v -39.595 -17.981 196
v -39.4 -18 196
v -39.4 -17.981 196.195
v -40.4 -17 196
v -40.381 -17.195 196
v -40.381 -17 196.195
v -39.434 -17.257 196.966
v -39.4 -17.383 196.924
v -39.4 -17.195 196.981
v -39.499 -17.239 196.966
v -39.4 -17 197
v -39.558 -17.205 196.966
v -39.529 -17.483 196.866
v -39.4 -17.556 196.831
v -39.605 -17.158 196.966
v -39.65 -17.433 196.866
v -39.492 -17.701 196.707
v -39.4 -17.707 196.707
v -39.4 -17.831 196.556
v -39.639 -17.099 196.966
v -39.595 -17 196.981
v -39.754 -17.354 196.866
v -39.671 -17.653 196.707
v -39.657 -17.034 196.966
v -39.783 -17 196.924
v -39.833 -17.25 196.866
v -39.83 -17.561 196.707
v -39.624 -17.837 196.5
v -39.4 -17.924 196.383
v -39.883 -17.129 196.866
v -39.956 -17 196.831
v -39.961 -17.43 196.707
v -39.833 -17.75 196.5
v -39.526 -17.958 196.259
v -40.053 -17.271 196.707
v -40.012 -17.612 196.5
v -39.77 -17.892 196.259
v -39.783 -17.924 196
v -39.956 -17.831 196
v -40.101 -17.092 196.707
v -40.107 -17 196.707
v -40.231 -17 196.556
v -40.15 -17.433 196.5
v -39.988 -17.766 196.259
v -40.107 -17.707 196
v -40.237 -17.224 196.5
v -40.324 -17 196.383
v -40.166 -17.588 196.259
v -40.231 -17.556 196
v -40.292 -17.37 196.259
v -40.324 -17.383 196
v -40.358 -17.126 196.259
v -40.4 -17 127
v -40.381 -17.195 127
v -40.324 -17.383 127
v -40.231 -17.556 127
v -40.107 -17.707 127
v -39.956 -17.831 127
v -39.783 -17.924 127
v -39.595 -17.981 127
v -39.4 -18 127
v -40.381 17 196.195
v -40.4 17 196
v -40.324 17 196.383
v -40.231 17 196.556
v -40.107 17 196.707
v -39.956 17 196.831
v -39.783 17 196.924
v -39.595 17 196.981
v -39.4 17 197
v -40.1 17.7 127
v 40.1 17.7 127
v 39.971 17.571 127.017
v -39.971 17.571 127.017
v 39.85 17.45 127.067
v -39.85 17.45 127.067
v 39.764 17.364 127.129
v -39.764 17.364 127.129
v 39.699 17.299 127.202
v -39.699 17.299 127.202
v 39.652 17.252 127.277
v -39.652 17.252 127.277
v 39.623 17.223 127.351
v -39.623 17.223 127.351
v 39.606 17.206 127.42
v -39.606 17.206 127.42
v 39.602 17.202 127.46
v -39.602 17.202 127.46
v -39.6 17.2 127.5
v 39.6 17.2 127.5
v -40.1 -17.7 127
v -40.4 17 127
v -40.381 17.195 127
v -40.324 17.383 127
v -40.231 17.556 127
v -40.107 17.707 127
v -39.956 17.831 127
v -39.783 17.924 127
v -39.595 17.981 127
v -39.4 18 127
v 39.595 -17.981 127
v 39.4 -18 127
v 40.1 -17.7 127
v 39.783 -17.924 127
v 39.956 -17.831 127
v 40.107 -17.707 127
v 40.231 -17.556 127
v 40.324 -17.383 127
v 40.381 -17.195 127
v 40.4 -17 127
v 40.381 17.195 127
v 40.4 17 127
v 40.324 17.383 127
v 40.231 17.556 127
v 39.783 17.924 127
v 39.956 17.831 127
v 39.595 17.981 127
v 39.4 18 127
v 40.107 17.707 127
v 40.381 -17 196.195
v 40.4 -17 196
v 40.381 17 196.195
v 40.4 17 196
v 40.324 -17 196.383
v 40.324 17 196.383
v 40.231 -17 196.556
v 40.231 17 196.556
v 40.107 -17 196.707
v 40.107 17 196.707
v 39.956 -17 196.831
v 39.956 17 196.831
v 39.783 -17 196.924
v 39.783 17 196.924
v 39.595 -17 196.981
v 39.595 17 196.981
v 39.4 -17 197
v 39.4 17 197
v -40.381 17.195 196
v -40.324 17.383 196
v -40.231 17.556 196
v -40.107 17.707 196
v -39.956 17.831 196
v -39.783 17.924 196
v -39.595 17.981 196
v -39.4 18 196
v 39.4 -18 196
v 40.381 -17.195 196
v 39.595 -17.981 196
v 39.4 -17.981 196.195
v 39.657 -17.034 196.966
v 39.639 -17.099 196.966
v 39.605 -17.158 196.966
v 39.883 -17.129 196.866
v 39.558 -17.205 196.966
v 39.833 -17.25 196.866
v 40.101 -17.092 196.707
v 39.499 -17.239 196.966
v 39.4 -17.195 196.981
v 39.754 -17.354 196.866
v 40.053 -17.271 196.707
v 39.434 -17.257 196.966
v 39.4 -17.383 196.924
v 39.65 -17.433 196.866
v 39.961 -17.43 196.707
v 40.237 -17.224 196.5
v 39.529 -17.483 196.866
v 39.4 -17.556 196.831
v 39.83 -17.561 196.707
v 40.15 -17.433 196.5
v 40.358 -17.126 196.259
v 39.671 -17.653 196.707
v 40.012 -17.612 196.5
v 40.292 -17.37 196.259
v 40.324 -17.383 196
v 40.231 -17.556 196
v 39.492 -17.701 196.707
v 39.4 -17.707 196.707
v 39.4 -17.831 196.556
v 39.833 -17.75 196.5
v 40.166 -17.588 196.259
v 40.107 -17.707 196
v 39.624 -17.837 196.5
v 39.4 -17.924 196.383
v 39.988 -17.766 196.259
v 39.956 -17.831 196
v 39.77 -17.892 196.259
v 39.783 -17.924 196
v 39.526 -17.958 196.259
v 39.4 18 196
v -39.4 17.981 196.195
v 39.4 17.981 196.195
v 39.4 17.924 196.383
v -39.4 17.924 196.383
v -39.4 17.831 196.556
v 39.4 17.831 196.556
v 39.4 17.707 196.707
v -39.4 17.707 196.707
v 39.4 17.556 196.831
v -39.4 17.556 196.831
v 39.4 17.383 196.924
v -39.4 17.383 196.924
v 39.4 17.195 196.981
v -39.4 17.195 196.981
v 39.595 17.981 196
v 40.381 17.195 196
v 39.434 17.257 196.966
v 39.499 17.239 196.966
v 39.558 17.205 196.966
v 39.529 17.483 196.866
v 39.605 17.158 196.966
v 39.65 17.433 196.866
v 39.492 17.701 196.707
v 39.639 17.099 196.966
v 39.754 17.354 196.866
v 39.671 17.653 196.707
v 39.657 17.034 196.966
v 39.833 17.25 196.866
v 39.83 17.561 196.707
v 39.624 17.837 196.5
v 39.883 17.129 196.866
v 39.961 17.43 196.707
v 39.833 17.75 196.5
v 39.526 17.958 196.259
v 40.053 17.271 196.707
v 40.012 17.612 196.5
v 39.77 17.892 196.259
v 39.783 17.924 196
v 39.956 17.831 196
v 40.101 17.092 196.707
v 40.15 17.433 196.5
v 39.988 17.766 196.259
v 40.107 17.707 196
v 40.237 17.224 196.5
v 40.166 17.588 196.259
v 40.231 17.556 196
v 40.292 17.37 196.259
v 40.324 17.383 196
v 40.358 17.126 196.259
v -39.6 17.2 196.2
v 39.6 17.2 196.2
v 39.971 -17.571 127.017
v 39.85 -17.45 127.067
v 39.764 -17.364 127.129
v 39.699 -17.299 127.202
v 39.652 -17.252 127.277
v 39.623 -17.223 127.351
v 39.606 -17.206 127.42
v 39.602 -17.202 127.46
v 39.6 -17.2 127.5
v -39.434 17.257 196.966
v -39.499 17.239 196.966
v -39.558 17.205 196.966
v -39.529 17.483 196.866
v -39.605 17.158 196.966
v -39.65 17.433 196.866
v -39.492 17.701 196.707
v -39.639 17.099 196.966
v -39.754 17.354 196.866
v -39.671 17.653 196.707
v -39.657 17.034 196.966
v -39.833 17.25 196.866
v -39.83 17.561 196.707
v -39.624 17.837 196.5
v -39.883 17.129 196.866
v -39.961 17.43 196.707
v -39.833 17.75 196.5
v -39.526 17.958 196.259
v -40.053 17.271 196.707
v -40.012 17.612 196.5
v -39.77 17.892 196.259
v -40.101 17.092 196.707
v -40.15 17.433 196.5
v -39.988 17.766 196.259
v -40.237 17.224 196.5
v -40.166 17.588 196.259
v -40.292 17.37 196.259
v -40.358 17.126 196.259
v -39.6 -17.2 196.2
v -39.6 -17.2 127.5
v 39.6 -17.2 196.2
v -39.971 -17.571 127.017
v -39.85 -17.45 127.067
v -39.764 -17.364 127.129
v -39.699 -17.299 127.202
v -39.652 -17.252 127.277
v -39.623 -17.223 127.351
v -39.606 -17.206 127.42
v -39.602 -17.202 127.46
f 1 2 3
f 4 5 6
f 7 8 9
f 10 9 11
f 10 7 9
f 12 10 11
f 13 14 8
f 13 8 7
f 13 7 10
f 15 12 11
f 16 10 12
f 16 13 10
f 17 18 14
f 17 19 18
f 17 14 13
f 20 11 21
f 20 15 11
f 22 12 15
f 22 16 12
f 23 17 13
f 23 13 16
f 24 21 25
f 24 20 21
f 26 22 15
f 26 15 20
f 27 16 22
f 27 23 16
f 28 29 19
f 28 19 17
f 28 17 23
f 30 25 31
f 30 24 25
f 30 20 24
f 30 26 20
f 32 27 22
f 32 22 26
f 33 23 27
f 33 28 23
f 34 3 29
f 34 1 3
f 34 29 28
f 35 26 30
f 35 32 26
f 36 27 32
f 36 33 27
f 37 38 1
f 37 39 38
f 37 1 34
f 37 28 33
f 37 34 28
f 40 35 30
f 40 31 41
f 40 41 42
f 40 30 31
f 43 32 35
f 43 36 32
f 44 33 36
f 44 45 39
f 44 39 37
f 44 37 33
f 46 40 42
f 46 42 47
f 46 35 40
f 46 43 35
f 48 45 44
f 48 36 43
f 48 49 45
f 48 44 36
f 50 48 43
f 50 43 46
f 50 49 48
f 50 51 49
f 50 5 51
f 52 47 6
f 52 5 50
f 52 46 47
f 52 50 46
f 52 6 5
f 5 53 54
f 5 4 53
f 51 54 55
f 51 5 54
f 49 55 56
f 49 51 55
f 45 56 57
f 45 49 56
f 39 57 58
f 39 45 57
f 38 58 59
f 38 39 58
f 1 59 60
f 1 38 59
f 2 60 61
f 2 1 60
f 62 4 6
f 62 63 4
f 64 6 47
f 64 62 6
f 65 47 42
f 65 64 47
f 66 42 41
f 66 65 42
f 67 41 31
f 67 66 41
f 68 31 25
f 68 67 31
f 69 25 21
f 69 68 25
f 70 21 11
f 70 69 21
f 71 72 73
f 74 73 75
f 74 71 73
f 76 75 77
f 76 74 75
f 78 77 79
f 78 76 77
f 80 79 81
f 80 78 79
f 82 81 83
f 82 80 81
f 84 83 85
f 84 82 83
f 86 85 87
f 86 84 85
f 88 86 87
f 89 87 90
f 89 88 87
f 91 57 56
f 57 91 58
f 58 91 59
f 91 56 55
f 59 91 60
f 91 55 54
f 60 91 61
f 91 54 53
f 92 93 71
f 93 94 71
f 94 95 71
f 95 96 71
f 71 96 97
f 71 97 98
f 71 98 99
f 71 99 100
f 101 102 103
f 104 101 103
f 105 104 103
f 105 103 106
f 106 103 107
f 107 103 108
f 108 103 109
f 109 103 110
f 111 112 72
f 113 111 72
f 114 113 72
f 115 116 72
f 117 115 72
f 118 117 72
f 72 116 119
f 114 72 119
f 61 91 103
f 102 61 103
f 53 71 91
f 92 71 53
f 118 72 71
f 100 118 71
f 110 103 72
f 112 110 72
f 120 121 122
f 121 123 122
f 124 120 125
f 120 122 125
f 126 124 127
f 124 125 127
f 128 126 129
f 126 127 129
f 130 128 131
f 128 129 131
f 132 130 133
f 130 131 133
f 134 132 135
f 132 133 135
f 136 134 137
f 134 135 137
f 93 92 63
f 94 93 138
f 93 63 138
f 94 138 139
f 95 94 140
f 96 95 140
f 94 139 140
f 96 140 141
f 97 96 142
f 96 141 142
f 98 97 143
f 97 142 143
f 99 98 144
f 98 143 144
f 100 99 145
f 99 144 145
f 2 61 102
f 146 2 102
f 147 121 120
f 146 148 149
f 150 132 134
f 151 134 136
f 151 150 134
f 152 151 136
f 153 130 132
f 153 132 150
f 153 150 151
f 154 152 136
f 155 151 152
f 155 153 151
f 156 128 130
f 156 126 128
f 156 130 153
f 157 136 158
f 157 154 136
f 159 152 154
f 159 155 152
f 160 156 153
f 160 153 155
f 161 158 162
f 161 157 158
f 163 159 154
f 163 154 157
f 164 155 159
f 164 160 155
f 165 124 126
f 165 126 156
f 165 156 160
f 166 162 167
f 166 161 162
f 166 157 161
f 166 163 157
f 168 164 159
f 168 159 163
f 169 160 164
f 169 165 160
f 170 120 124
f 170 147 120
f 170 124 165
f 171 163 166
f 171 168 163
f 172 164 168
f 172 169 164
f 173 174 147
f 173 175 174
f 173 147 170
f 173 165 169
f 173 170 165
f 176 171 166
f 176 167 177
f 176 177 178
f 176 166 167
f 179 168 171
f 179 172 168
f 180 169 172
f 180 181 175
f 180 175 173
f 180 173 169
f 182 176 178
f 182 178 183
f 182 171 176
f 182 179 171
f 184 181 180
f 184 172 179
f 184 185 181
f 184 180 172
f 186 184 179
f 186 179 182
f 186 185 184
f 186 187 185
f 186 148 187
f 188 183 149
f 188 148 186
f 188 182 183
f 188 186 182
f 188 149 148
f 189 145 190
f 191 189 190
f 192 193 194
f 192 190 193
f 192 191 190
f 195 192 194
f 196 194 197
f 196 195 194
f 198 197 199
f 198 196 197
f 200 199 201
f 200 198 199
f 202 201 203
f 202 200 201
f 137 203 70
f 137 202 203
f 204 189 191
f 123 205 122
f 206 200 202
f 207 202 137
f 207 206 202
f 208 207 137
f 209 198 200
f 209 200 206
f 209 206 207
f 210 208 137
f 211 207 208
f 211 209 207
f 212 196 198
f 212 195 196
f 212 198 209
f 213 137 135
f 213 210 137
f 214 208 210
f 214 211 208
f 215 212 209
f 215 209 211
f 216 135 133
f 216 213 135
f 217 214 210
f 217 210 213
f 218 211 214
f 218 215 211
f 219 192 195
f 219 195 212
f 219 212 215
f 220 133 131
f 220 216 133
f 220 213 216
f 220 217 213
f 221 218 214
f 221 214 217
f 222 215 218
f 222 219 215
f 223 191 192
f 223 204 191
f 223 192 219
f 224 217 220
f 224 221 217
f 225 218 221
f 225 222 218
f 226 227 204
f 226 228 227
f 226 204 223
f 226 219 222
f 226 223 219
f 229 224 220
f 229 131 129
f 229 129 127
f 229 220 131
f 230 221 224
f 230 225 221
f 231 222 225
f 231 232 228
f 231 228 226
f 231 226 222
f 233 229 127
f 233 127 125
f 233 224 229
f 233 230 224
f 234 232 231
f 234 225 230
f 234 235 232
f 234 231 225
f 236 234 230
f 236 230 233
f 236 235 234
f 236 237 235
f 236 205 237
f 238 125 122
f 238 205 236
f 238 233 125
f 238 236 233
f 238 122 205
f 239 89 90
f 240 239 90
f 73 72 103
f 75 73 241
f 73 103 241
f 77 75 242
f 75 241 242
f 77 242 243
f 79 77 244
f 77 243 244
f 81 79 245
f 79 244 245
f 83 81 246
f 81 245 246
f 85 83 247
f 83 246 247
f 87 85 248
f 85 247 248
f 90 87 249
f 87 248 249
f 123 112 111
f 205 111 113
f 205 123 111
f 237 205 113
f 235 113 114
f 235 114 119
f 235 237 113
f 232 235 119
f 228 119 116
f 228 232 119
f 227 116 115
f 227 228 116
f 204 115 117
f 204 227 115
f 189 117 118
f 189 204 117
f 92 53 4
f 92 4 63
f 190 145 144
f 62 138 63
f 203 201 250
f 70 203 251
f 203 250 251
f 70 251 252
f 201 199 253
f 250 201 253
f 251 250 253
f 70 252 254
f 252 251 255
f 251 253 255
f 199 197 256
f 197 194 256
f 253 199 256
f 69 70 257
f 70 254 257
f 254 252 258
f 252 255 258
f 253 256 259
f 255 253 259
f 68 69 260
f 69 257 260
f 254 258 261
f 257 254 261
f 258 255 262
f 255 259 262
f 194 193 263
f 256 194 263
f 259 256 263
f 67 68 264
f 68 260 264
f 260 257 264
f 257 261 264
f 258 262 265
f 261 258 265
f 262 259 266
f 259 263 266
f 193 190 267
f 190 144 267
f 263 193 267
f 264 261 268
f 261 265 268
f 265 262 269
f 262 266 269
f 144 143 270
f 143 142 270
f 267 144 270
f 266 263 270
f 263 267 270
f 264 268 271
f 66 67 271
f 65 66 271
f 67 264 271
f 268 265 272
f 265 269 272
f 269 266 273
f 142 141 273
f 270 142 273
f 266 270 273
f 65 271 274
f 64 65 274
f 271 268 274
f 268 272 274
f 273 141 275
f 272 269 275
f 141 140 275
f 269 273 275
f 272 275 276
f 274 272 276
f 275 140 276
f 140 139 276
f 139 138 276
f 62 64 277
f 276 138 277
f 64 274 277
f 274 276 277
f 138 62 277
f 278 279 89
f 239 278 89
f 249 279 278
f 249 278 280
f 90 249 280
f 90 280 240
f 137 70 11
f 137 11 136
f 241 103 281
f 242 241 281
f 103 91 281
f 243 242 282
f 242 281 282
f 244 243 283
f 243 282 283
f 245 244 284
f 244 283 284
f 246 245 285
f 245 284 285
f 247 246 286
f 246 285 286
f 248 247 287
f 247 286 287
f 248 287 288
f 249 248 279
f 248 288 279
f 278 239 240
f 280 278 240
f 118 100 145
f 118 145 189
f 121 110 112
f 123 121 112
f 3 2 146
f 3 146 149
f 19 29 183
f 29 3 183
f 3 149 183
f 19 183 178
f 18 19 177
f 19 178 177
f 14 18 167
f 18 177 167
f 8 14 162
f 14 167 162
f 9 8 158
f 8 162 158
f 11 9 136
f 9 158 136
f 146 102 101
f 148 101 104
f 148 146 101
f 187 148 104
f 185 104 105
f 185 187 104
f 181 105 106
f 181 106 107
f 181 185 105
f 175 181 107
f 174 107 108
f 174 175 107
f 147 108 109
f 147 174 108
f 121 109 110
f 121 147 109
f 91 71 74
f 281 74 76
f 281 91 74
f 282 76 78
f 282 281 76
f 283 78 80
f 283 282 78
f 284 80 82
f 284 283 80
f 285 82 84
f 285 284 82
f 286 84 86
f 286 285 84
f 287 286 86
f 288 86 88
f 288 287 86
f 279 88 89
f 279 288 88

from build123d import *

# Parameters (mm, degrees)
SKETCH002_W    = 80.8
SKETCH002_H    = 36
PAD001_DEPTH   = 70
THICKNESS001_T = -0.8
FILLET_R       = 1
FILLET005_R    = 0.5


with BuildPart() as part:
    # Sketch002 → Pad001 (new body)
    with BuildSketch(Plane.XY):
        Rectangle(SKETCH002_W, SKETCH002_H)
    extrude(amount=PAD001_DEPTH)

    # Thickness001
    thickness001_openings = [part.faces().sort_by_distance(p)[0] for p in [
        (0, 0, 0),
    ]]
    offset(amount=THICKNESS001_T, openings=thickness001_openings, kind=Kind.INTERSECTION)

    # Fillet
    fillet_edges = [part.edges().sort_by_distance(p)[0] for p in [
        (-40.4, 18, 35),
        (-40.4, -18, 35),
        (40.4, 18, 35),
        (0, 18, 70),
        (40.4, -18, 35),
        (40.4, 0, 70),
        (0, -18, 70),
        (-40.4, 0, 70),
    ]]
    fillet(fillet_edges, radius=FILLET_R)

    # Fillet005
    fillet005_edges = [part.edges().sort_by_distance(p)[0] for p in [
        (0, -17.2, 0),
        (-39.6, 0, 0),
        (39.6, 0, 0),
        (0, 17.2, 0),
    ]]
    fillet(fillet005_edges, radius=FILLET005_R)


with BuildPart() as part_1:
    # Body001 placement: moved
    add(part.part.moved(Location((0, 0, 127))))


solid = part_1.part
